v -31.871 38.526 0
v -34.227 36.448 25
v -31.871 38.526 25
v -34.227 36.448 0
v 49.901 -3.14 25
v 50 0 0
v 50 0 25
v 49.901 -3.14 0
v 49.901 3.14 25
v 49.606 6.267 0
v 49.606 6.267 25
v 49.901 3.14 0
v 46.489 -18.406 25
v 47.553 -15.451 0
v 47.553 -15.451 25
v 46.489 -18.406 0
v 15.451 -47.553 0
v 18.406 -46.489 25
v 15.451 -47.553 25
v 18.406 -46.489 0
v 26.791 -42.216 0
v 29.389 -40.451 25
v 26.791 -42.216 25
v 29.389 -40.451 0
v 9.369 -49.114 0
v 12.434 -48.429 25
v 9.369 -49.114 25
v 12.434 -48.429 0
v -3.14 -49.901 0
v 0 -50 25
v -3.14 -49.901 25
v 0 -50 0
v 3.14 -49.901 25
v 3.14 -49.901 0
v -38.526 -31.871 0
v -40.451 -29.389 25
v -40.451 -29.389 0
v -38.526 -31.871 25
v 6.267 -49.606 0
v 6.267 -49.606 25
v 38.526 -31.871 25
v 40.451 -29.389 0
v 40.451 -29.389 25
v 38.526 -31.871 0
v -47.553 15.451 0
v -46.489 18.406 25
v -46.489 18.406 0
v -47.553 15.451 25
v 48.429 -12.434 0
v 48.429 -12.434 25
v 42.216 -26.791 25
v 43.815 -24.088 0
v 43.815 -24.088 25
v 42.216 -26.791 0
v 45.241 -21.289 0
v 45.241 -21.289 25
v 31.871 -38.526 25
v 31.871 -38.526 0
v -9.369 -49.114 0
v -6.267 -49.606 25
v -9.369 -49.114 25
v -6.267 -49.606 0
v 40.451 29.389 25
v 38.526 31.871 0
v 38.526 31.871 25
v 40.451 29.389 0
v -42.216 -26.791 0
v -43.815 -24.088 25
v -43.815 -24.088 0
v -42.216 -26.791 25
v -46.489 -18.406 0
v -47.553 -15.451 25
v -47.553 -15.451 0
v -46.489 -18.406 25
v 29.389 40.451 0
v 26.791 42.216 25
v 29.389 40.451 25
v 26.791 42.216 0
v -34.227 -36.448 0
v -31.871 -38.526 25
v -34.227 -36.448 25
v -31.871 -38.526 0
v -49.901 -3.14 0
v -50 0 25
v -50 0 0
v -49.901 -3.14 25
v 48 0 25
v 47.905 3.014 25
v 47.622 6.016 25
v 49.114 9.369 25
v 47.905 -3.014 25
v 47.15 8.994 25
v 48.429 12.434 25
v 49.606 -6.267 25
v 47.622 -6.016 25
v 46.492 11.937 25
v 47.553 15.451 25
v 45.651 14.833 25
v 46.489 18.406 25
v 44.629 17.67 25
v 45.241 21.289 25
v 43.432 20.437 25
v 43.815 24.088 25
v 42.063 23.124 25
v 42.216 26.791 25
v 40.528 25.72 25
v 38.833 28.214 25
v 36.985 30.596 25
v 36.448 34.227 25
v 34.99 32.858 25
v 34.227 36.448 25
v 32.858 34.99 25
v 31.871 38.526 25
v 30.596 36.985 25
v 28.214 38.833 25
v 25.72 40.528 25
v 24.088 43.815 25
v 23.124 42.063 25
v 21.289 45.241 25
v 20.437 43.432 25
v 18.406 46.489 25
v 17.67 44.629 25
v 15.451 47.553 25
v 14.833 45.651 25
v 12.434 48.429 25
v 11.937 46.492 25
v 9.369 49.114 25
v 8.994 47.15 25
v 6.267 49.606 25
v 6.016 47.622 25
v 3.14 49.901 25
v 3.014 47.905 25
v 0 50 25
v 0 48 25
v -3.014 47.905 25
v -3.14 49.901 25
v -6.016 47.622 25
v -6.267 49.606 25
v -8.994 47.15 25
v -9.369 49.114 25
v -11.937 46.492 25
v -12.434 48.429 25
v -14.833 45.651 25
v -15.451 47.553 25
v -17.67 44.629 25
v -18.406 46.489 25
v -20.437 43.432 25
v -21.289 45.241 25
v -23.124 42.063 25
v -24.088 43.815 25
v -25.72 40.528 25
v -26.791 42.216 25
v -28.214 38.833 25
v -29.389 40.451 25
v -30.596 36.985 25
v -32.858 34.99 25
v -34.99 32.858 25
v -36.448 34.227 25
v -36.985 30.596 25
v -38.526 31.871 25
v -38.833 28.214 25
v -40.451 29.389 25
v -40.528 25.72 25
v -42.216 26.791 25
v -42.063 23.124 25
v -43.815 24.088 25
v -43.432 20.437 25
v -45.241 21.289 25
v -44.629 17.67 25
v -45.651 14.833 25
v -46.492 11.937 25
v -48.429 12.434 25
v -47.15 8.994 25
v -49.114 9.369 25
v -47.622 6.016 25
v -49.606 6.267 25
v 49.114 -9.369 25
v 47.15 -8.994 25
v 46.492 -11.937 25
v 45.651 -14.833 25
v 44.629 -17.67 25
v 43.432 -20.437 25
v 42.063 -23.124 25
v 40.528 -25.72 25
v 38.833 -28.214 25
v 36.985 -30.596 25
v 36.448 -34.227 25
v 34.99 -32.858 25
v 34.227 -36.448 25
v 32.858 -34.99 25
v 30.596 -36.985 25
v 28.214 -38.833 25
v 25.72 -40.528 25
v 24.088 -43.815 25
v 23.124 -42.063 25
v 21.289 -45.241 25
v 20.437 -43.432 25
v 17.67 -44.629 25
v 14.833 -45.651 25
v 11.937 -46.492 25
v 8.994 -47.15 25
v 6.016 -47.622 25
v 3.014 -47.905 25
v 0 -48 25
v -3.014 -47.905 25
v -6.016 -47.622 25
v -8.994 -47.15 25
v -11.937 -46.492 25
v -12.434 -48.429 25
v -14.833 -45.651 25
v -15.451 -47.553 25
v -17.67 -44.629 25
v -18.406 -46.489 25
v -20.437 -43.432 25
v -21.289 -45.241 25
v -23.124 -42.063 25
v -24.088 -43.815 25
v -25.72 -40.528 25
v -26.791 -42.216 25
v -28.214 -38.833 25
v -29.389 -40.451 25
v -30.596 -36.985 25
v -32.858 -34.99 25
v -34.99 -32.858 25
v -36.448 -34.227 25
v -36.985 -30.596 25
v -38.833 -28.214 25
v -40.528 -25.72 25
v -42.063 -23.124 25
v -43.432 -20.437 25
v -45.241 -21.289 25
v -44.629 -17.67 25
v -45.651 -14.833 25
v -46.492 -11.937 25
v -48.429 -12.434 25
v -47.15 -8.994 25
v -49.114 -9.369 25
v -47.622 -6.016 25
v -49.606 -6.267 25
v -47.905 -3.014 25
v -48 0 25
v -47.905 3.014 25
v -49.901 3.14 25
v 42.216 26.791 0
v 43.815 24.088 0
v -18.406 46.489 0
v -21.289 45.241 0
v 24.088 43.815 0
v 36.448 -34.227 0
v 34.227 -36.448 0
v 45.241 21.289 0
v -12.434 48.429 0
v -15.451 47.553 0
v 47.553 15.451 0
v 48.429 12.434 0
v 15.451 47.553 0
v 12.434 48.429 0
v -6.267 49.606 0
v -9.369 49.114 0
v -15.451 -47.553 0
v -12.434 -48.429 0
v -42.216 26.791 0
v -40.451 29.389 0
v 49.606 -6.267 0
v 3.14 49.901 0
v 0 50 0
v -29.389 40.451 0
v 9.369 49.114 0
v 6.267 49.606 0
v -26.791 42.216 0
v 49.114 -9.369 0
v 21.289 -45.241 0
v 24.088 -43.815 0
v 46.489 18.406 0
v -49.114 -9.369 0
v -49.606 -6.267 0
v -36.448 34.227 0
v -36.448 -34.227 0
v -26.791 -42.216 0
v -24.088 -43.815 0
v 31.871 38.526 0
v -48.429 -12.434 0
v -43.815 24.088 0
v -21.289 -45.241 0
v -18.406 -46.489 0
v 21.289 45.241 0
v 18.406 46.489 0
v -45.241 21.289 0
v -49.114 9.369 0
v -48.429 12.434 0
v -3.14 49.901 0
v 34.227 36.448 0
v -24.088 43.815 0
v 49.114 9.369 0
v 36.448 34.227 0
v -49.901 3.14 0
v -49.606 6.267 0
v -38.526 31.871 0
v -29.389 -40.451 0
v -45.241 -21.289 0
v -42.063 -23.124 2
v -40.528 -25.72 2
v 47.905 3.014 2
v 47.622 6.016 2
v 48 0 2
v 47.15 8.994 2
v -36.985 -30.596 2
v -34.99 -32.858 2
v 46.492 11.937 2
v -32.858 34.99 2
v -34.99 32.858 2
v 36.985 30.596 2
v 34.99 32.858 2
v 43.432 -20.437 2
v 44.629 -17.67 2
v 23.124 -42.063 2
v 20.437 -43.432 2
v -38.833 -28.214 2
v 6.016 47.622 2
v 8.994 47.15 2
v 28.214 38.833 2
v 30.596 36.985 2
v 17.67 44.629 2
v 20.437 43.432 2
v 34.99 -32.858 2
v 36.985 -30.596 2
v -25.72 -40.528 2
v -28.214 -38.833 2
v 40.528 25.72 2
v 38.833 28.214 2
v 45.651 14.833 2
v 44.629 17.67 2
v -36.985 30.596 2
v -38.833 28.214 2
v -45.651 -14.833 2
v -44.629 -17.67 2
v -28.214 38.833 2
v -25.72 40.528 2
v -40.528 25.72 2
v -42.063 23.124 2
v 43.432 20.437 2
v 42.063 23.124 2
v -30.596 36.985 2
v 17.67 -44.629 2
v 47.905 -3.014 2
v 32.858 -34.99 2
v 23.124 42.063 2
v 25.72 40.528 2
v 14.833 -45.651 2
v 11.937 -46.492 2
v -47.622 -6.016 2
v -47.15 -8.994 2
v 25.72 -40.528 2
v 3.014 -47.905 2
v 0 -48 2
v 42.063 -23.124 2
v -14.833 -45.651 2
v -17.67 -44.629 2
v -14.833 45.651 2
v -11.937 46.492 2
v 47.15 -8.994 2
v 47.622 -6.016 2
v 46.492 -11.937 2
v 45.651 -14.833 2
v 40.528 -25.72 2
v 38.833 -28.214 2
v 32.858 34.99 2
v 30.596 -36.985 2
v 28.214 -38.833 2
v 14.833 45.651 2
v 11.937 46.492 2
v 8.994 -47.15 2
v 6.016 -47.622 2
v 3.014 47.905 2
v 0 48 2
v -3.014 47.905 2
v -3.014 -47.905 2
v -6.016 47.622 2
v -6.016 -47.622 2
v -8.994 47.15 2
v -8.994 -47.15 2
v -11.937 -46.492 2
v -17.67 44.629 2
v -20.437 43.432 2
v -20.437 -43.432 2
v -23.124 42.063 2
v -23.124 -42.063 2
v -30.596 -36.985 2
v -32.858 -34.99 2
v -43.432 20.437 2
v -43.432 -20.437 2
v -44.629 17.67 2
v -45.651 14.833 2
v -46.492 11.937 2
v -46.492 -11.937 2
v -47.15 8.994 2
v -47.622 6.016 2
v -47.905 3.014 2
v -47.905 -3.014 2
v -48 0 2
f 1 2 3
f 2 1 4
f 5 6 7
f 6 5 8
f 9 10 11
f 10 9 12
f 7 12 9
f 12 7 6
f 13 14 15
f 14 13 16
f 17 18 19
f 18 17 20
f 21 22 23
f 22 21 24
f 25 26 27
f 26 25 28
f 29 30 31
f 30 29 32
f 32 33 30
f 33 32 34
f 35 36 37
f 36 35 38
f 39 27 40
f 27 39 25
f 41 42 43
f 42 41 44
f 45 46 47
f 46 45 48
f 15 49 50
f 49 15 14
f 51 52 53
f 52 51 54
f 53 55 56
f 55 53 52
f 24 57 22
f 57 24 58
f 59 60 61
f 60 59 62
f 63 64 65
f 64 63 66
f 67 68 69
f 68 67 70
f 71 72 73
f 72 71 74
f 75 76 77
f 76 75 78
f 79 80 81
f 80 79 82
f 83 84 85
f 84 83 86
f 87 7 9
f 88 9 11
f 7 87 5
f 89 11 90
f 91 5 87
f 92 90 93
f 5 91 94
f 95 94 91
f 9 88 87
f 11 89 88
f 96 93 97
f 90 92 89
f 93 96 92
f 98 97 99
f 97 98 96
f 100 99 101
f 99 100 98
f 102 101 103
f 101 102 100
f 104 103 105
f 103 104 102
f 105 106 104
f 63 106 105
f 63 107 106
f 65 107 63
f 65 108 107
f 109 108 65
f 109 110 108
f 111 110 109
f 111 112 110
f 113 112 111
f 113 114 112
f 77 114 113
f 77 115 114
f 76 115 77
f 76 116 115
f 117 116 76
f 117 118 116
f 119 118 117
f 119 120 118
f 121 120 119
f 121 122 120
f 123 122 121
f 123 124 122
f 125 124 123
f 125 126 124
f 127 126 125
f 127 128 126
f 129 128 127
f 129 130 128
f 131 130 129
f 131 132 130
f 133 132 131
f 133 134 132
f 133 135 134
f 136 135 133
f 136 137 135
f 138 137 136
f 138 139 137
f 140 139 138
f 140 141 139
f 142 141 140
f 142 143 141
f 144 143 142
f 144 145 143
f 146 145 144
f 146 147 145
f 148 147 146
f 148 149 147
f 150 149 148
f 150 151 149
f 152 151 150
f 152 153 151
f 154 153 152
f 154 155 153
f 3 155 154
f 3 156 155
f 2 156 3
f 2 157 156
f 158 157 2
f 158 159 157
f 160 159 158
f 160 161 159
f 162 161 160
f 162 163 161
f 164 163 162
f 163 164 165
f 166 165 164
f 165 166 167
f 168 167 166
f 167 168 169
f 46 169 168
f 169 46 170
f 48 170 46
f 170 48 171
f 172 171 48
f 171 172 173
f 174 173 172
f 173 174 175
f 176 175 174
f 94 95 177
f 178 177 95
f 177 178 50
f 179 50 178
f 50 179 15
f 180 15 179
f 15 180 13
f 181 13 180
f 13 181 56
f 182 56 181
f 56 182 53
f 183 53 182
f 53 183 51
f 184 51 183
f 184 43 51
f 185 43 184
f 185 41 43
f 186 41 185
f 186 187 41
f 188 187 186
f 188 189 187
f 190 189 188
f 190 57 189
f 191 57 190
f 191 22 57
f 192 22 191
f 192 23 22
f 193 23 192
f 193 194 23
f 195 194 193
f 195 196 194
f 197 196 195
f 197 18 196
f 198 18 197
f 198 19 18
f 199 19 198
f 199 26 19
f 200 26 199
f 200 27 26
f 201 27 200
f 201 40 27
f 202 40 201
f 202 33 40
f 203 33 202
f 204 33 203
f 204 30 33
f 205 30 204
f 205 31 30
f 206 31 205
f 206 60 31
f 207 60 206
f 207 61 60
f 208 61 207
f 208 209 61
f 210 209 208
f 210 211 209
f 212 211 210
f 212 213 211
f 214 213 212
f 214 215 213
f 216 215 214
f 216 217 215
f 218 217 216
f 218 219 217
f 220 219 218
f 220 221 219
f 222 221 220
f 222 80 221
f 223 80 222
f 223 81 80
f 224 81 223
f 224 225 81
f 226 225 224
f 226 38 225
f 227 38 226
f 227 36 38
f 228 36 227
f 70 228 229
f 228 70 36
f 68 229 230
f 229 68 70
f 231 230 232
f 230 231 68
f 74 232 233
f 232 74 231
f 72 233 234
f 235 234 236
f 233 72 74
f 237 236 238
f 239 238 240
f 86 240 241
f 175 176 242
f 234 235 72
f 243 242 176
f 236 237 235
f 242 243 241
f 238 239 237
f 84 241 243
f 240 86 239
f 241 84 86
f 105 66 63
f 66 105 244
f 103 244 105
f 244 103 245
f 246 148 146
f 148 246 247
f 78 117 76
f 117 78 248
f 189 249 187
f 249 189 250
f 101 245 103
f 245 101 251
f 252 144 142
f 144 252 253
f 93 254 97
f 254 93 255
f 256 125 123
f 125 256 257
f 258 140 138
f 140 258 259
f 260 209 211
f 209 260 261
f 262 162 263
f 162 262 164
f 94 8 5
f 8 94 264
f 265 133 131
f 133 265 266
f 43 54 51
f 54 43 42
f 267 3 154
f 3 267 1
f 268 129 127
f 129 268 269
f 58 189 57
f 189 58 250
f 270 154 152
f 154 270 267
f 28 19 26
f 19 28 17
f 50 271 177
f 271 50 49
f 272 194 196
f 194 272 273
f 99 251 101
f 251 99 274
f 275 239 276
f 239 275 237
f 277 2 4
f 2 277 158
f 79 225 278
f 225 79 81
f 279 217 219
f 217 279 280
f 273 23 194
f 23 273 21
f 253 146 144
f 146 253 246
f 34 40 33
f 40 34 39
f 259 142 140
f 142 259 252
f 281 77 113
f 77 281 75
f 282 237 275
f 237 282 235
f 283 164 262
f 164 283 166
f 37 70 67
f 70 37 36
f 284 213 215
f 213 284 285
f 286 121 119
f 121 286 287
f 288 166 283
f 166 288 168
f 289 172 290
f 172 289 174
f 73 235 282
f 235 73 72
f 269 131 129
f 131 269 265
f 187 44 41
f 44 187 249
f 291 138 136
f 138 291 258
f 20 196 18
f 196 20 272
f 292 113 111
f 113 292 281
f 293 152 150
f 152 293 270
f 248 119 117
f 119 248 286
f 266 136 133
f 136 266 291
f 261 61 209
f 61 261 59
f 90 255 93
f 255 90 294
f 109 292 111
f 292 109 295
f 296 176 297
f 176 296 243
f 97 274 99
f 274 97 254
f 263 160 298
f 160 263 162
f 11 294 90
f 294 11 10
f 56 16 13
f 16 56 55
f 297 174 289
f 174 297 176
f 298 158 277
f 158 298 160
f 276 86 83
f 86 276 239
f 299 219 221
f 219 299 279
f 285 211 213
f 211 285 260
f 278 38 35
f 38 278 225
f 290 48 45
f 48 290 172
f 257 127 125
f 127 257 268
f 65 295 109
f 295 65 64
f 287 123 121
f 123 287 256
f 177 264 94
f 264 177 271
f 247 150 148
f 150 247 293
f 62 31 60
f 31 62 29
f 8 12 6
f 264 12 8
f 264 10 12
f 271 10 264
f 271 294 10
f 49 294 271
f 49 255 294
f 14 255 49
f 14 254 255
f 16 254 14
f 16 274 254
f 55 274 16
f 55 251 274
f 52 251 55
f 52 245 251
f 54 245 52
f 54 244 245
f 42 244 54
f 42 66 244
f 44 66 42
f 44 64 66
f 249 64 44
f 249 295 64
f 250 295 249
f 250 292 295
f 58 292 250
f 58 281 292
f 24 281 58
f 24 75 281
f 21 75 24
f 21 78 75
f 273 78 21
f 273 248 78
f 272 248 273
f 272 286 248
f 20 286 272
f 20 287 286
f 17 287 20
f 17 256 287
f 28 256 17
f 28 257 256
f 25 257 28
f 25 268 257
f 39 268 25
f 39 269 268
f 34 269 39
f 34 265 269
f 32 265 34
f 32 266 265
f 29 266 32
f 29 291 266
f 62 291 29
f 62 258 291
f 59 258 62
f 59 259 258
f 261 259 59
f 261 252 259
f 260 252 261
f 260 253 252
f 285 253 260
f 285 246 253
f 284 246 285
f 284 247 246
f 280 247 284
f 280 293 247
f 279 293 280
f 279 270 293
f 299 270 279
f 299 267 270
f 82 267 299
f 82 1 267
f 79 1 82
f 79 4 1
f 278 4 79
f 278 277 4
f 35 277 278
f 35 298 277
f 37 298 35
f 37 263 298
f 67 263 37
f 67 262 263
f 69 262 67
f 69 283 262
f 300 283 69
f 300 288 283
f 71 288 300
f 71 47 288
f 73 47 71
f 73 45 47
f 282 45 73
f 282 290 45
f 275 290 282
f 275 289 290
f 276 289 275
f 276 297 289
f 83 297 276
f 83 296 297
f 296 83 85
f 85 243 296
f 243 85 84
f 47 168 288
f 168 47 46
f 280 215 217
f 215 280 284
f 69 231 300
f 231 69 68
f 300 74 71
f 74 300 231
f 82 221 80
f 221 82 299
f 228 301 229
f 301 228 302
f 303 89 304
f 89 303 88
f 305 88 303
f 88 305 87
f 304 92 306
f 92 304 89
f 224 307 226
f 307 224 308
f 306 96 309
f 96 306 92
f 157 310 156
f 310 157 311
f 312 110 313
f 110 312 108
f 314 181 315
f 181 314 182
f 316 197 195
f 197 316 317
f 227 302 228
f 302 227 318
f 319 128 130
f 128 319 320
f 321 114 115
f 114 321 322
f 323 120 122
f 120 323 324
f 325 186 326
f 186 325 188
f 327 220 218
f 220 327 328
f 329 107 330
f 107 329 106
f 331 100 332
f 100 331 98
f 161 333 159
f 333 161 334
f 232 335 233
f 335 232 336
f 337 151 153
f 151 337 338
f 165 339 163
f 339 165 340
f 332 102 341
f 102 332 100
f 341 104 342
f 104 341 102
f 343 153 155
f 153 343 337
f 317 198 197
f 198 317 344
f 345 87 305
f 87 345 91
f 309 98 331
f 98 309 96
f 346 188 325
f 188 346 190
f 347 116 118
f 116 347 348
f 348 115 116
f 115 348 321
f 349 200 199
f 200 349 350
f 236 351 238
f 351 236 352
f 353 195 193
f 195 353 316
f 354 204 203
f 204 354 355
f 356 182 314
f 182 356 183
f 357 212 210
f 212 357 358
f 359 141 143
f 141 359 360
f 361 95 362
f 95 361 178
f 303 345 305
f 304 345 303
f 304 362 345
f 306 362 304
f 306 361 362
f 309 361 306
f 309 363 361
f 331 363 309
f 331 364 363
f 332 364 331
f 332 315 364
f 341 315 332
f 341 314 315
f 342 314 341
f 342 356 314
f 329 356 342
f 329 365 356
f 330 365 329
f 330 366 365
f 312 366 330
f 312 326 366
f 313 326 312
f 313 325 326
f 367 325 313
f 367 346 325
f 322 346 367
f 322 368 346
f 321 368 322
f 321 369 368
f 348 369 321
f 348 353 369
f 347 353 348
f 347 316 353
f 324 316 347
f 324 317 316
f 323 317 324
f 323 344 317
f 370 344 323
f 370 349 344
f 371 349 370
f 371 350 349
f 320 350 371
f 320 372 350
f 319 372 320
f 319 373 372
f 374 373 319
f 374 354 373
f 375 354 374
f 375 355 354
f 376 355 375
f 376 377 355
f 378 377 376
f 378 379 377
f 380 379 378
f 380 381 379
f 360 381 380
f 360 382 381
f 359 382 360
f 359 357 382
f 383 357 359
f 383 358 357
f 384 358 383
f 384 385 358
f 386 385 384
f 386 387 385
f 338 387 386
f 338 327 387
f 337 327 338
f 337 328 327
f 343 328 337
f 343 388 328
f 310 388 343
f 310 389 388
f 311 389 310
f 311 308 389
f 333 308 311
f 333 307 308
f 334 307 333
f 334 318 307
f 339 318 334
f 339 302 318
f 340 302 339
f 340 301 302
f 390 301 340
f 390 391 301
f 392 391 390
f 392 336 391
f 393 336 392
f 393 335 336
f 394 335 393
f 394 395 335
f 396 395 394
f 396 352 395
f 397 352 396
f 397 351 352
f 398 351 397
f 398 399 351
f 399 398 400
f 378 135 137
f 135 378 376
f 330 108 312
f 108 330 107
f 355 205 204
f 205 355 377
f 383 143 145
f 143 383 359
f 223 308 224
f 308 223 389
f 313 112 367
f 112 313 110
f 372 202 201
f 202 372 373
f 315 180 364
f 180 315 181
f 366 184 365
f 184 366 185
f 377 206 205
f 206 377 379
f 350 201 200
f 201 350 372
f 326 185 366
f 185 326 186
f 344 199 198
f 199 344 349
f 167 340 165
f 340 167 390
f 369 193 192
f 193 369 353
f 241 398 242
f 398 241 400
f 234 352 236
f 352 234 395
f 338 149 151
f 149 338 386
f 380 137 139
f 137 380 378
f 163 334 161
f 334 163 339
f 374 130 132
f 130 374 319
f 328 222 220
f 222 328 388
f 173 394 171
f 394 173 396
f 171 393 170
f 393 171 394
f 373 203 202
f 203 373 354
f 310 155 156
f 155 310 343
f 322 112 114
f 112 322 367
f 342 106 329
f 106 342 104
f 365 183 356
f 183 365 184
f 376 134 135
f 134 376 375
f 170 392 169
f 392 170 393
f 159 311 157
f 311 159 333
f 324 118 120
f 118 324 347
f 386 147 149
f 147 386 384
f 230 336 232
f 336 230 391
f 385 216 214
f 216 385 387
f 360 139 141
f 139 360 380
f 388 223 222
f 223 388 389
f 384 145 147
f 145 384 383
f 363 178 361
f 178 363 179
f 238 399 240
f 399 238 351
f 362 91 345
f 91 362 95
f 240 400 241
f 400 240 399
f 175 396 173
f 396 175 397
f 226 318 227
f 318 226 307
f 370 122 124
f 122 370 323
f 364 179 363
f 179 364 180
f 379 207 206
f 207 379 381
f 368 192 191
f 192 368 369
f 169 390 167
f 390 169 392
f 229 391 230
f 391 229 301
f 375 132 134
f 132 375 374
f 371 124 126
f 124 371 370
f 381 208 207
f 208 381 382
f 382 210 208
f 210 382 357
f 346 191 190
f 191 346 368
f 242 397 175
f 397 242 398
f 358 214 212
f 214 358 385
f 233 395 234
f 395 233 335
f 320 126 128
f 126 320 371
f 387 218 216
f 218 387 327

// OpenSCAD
// file: parameters.scad
$radius = 100;
$height = 50;

$margin = 2;

// Translates to $fn in `cylinder(...)`
$roundness = 100;

$connection = 5;

$hole_dia = 4;
// main file
include <parameters.scad>

module basin() {
  color("cyan") difference() {
    cylinder(h = $height / 2, r = $radius / 2, $fn = $roundness);

    // DIFF
    translate([ 0, 0, $margin ])
        cylinder(h = $height / 2, r = $radius / 2 - $margin, $fn = $roundness);
  }
}
basin();
